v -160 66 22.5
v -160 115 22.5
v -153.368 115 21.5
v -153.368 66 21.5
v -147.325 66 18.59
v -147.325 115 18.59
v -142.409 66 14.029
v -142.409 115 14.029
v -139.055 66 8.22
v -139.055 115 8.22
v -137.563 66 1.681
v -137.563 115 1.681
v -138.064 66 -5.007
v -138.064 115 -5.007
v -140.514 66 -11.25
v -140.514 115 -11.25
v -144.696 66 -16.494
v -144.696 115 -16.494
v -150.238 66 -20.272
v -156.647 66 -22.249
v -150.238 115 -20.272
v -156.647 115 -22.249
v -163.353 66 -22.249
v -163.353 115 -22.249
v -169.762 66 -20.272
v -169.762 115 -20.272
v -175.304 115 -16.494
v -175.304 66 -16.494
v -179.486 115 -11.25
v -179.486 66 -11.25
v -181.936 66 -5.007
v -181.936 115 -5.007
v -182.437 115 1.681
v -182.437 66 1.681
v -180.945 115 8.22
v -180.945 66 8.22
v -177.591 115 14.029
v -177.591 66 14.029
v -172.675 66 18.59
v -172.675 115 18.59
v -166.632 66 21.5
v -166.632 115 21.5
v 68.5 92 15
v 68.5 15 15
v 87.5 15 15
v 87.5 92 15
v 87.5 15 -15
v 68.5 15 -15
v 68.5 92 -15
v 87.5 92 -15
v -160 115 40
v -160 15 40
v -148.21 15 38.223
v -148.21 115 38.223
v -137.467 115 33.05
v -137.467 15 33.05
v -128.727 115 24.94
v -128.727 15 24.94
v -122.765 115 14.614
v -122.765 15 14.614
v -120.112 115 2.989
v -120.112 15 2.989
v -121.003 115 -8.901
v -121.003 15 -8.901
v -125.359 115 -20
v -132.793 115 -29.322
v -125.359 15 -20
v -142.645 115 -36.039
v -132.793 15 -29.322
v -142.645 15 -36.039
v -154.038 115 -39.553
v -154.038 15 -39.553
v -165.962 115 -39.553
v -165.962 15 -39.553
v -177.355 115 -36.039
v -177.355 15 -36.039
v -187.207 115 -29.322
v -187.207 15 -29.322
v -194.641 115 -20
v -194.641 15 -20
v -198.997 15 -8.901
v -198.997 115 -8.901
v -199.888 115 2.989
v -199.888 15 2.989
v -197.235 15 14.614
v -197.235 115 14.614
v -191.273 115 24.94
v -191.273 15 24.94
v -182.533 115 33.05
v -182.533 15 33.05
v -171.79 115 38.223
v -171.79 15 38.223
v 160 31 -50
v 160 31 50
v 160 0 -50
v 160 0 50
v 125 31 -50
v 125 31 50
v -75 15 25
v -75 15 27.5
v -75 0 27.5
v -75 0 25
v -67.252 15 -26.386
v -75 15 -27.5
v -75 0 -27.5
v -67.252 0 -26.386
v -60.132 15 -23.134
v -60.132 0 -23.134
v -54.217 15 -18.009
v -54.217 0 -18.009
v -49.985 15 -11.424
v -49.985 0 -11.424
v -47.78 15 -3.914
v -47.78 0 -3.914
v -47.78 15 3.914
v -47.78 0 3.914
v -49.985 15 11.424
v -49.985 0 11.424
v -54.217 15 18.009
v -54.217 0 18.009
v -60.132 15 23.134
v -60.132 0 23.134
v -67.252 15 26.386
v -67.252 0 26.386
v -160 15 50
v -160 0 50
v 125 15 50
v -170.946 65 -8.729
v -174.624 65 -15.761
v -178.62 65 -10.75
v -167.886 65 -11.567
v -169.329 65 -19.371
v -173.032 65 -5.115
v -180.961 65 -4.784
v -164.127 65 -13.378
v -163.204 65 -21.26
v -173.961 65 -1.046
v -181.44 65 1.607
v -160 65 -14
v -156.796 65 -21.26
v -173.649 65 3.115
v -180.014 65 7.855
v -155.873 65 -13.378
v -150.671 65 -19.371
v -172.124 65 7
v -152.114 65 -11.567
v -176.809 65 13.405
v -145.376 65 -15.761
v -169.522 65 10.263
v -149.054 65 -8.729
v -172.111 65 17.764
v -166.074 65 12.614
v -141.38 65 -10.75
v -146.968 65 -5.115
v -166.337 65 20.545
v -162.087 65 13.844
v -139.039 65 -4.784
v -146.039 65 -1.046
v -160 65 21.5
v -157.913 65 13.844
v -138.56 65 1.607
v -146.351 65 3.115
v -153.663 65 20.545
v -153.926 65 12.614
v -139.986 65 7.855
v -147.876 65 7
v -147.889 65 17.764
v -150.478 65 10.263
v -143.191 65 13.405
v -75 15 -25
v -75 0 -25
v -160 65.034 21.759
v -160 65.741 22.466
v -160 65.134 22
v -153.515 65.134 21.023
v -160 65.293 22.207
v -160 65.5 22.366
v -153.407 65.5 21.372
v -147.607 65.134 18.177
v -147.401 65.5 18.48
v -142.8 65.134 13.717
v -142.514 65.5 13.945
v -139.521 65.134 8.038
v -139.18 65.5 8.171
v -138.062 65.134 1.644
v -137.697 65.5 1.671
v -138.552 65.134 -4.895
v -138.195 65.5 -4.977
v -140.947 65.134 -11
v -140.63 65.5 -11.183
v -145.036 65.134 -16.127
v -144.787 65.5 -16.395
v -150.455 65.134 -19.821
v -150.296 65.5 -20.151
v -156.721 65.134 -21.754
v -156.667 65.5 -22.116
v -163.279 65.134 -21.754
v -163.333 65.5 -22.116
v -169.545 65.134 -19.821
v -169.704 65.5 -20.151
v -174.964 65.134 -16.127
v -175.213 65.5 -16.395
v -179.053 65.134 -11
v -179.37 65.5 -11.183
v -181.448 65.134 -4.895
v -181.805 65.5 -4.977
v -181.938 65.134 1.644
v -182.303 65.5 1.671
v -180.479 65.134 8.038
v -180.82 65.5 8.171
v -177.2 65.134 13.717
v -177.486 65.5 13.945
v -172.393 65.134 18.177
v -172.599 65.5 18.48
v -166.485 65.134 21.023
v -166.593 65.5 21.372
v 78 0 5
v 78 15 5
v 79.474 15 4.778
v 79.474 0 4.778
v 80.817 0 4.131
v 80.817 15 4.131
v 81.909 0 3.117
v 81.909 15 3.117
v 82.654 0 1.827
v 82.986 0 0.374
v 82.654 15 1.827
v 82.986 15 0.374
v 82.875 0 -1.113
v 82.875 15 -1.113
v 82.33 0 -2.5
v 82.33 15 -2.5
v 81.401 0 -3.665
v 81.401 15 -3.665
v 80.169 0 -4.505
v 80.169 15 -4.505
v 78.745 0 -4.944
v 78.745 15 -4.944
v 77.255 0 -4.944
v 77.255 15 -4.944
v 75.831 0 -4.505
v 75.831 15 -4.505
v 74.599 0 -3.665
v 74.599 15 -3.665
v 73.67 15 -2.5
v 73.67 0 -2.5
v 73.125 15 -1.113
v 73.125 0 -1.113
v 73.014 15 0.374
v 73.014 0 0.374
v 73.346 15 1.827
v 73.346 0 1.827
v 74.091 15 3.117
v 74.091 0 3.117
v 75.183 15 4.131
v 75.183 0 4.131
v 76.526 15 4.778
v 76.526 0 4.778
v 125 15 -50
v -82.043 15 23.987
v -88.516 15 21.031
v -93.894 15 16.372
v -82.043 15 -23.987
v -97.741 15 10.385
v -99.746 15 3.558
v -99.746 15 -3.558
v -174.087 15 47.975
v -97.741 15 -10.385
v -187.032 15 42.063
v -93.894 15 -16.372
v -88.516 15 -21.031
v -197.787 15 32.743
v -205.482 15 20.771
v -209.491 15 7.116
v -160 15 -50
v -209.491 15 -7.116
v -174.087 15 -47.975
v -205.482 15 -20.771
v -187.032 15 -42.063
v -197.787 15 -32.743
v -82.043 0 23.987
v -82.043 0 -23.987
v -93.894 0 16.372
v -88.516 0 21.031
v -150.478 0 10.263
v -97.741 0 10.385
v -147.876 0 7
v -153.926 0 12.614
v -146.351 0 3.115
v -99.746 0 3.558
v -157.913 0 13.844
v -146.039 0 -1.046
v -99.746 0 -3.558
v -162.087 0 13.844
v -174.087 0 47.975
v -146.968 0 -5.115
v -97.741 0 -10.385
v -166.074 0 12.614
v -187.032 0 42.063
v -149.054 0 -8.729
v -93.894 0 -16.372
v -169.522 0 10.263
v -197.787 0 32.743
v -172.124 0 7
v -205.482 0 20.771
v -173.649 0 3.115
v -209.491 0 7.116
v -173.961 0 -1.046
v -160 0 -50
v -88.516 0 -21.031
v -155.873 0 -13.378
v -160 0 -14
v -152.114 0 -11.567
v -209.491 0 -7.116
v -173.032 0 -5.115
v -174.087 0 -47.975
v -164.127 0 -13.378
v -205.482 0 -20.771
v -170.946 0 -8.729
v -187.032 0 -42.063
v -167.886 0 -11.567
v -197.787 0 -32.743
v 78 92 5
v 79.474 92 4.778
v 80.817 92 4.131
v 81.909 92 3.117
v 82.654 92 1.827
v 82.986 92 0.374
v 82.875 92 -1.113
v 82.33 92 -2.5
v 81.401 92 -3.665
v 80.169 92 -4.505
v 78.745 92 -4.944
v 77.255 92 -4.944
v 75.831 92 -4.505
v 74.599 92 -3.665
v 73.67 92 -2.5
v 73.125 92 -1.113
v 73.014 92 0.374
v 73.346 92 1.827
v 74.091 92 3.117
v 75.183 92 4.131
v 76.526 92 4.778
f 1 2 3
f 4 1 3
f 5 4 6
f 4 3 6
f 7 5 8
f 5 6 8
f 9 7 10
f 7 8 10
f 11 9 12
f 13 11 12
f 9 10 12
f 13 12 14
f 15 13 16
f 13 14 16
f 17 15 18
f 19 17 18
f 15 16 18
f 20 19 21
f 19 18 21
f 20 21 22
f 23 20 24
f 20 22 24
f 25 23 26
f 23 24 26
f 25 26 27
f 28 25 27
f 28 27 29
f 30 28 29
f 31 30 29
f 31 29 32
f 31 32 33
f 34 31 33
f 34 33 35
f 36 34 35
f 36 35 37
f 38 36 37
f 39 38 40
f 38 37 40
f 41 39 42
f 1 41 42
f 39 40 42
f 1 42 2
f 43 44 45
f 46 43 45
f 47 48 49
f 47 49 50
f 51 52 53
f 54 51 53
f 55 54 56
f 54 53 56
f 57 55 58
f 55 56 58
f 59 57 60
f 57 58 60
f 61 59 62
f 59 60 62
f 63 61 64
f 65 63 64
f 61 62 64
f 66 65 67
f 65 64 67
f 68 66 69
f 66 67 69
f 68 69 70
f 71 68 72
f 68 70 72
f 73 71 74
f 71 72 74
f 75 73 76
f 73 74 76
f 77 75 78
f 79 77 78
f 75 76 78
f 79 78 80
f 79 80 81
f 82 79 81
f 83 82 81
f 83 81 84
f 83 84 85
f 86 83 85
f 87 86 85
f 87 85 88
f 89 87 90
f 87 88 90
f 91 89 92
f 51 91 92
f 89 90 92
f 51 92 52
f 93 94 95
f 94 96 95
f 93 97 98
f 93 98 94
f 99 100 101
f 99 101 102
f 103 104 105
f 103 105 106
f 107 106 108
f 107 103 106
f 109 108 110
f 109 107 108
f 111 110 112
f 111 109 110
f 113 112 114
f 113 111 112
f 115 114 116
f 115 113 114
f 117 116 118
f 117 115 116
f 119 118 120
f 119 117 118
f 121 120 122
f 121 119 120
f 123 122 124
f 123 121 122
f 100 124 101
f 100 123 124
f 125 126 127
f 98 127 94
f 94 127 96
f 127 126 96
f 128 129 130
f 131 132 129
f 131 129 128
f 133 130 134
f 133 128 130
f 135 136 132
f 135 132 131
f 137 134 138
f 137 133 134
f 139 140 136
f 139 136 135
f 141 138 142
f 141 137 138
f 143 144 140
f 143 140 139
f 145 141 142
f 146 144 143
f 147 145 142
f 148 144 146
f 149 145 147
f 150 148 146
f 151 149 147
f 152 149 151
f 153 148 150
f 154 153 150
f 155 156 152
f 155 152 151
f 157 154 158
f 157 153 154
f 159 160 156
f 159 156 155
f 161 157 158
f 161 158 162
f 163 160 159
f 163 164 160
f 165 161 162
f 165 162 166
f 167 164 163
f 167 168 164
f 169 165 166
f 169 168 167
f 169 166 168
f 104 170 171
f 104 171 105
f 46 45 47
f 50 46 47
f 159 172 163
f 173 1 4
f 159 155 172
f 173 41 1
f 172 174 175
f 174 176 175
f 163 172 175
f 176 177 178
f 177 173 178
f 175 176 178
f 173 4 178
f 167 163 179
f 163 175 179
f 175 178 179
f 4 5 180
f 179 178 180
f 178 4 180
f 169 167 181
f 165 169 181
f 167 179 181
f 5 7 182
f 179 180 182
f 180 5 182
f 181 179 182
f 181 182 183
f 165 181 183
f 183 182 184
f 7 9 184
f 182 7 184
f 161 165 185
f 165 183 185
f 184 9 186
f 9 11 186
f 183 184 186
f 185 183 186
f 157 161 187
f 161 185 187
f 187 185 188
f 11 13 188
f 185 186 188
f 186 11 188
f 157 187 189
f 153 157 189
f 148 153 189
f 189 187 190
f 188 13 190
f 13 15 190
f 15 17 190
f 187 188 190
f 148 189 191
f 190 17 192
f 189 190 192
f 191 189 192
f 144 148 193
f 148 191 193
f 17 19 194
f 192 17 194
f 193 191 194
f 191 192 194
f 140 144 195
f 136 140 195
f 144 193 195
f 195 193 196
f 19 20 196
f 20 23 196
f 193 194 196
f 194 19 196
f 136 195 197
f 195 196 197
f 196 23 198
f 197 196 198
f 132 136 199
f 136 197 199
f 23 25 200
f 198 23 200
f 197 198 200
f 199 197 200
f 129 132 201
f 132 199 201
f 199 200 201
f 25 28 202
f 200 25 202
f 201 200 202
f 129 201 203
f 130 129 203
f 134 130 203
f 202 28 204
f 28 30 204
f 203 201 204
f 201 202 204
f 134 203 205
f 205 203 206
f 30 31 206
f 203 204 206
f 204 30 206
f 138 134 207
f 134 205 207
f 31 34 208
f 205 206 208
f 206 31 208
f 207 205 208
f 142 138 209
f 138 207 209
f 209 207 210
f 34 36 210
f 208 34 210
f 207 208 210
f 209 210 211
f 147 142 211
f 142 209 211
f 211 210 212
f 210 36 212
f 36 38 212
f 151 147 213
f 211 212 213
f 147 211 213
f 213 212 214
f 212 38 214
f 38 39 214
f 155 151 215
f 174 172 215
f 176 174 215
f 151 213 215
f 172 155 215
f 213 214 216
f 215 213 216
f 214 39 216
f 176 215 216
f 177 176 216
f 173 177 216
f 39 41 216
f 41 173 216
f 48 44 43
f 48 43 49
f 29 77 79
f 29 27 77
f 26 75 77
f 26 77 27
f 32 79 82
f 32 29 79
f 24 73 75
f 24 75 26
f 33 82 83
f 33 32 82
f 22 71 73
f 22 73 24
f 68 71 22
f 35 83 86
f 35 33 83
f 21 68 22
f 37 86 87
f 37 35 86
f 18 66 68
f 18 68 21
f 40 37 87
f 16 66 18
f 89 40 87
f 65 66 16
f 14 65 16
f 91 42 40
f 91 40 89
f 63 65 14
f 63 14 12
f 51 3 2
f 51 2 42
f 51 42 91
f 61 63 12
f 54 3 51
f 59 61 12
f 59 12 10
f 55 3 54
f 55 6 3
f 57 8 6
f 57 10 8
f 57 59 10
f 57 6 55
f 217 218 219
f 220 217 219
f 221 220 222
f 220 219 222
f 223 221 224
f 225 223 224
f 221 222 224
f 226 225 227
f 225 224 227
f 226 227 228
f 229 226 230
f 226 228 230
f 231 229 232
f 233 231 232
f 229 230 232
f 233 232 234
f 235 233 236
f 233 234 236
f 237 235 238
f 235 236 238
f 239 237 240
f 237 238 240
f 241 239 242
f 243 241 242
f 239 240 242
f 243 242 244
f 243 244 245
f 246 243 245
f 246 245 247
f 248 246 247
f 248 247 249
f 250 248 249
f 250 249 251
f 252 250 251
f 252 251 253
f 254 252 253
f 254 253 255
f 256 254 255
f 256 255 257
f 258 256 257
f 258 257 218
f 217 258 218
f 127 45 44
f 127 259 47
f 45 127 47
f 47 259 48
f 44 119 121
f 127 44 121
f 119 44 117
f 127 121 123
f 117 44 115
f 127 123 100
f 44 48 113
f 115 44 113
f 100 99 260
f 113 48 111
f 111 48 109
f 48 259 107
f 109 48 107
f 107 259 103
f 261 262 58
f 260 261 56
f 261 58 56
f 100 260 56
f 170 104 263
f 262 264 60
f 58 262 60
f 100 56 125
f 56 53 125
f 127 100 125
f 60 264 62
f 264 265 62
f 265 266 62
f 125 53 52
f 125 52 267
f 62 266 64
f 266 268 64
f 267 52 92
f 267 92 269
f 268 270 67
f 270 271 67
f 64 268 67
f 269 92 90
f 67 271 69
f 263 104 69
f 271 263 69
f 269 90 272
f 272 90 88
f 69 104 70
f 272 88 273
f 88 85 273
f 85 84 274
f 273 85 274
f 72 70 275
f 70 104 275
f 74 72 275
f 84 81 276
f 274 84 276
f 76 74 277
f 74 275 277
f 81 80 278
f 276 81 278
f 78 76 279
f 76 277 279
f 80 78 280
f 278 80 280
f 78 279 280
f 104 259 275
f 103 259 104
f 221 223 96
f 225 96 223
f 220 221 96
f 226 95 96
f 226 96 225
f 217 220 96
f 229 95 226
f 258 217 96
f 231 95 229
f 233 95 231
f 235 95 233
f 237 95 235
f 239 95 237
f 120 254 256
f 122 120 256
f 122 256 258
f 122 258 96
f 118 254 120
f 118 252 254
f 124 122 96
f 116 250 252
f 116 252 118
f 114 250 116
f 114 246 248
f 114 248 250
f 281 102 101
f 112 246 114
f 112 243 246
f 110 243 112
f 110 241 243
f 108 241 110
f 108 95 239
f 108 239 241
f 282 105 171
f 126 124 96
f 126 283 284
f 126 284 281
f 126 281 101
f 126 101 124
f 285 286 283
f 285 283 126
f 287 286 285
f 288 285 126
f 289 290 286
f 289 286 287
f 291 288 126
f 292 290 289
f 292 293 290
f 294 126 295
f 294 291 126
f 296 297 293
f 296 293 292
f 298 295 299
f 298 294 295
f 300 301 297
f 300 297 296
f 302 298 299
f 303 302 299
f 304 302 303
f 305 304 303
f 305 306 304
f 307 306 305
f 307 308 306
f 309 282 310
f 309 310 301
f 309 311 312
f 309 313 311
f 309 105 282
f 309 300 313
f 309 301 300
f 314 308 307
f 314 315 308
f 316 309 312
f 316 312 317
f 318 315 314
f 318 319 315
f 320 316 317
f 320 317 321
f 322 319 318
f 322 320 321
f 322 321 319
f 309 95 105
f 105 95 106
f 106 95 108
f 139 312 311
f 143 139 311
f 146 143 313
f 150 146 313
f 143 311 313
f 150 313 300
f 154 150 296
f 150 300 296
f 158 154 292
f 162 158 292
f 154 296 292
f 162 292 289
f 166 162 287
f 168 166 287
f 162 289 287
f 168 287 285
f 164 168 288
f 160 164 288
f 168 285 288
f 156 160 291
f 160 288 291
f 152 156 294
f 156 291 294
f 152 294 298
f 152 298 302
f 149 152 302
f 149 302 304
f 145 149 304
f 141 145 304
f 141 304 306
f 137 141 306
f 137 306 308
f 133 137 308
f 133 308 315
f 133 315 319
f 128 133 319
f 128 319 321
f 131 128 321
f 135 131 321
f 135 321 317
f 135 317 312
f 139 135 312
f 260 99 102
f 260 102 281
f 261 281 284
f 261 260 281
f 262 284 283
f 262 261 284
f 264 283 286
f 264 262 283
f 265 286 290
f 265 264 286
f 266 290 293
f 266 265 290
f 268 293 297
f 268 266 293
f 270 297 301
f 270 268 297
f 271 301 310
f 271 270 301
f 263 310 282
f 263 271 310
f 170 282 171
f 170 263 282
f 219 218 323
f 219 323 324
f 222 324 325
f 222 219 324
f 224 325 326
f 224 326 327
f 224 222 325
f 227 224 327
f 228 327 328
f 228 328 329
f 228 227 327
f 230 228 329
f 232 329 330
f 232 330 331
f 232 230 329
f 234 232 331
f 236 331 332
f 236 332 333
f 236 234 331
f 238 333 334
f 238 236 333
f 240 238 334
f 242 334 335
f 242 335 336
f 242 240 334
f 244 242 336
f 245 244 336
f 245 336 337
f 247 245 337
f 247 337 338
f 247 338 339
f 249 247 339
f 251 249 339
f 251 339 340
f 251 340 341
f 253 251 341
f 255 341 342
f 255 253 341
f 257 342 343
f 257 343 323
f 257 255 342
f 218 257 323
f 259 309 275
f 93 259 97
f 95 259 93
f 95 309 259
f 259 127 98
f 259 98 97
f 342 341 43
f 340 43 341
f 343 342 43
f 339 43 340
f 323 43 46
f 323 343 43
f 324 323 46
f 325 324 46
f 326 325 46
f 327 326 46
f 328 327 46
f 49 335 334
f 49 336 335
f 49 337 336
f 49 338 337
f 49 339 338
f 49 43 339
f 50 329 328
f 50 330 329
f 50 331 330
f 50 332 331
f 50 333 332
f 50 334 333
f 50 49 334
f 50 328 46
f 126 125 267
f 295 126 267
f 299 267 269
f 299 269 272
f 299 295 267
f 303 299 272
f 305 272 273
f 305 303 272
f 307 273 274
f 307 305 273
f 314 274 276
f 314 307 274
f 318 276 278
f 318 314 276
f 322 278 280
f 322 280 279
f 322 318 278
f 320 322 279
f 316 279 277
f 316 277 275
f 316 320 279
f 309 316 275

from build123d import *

# Parameters (mm, degrees)
BOSS_EXTRUDE1_DEPTH          = 15
SKETCH3_R                    = 40
BOSS_EXTRUDE2_DEPTH          = 100
TAP_DRILL_FOR_M30X2_0_TAP1_D = 28
SKETCH5_R                    = 22.5
CUT_EXTRUDE1_DEPTH           = 50
SKETCH6_W                    = 35
SKETCH6_H                    = 100
BOSS_EXTRUDE3_DEPTH          = 16
SKETCH7_R                    = 15
CUT_EXTRUDE2_DEPTH           = 238.907545067
SKETCH8_W                    = 19
SKETCH8_H                    = 30
SKETCH8_R                    = 5
BOSS_EXTRUDE4_DEPTH          = 77
CUT_EXTRUDE3_DEPTH           = 238.907545067
SKETCH10_R                   = 5
CUT_EXTRUDE4_DEPTH           = 238.907545067
FILLET1_R                    = 1


with BuildPart() as part:
    # Sketch2 → Boss-Extrude1 (new body)
    with BuildSketch(Plane(origin=(0, 0, 0), x_dir=(1, 0, 0), z_dir=(0, 1, 0))):
        with BuildLine():
            Line((-160, 50), (160, 50))
            Line((160, 50), (160, -50))
            Line((160, -50), (-160, -50))
            ThreePointArc((-160, -50), (-210, 0), (-160, 50))
        make_face()
    extrude(amount=BOSS_EXTRUDE1_DEPTH)

    # Sketch3 → Boss-Extrude2 (add)
    with BuildSketch(Plane(origin=(0, 15, 0), x_dir=(1, 0, 0), z_dir=(0, 1, 0))):
        with Locations(Location((-160, 0, 0), (0, 0, 270))):
            Circle(SKETCH3_R)
    extrude(amount=BOSS_EXTRUDE2_DEPTH)

    # Tap Drill for M30x2.0 Tap1 (through all)
    with Locations(Plane(origin=(-160, 115, 0), x_dir=(0, 0, 1), z_dir=(0, 1, 0))):
        with Locations((0, 0)):
            Hole(TAP_DRILL_FOR_M30X2_0_TAP1_D / 2)

    # Sketch5 → Cut-Extrude1 (cut)
    with BuildSketch(Plane(origin=(0, 115, 0), x_dir=(1, 0, 0), z_dir=(0, 1, 0))):
        with Locations(Location((-160, 0, 0), (0, 0, 270))):
            Circle(SKETCH5_R)
    extrude(amount=-CUT_EXTRUDE1_DEPTH, mode=Mode.SUBTRACT)

    # Sketch6 → Boss-Extrude3 (add)
    with BuildSketch(Plane(origin=(0, 15, 0), x_dir=(1, 0, 0), z_dir=(0, 1, 0))):
        with Locations((142.5, 0)):
            Rectangle(SKETCH6_W, SKETCH6_H)
    extrude(amount=BOSS_EXTRUDE3_DEPTH)

    # Sketch7 → Cut-Extrude2 (cut, through all)
    with BuildSketch(Plane(origin=(0, 15, 0), x_dir=(1, 0, 0), z_dir=(0, 1, 0))):
        with Locations(Location((-75, 0, 0), (0, 0, 270))):
            Circle(SKETCH7_R)
    extrude(amount=-CUT_EXTRUDE2_DEPTH, mode=Mode.SUBTRACT)

    # Sketch8 → Boss-Extrude4 (add)
    with BuildSketch(Plane(origin=(0, 15, 0), x_dir=(1, 0, 0), z_dir=(0, 1, 0))):
        with Locations((78, 0)):
            Rectangle(SKETCH8_W, SKETCH8_H)
        with Locations(Location((78, 0, 0), (0, 0, 270))):
            Circle(SKETCH8_R, mode=Mode.SUBTRACT)
    extrude(amount=BOSS_EXTRUDE4_DEPTH)

    # Sketch9 → Cut-Extrude3 (cut, through all)
    with BuildSketch(Plane(origin=(0, 15, 0), x_dir=(1, 0, 0), z_dir=(0, 1, 0))):
        with BuildLine():
            Line((-75, -27.5), (-75, -25))
            ThreePointArc((-75, -25), (-100, 0), (-75, 25))
            Line((-75, 25), (-75, 27.5))
            ThreePointArc((-75, 27.5), (-47.5, 0), (-75, -27.5))
        make_face()
    extrude(amount=-CUT_EXTRUDE3_DEPTH, mode=Mode.SUBTRACT)

    # Sketch10 → Cut-Extrude4 (cut, through all)
    with BuildSketch(Plane(origin=(0, 15, 0), x_dir=(1, 0, 0), z_dir=(0, 1, 0))):
        with Locations(Location((78, 0, 0), (0, 0, 270))):
            Circle(SKETCH10_R)
    extrude(amount=-CUT_EXTRUDE4_DEPTH, mode=Mode.SUBTRACT)

    # Fillet1
    fillet1_edges = [part.edges().sort_by_distance(p)[0] for p in [
        (-160, 65, -22.5),
    ]]
    fillet(fillet1_edges, radius=FILLET1_R)


solid = part.part
